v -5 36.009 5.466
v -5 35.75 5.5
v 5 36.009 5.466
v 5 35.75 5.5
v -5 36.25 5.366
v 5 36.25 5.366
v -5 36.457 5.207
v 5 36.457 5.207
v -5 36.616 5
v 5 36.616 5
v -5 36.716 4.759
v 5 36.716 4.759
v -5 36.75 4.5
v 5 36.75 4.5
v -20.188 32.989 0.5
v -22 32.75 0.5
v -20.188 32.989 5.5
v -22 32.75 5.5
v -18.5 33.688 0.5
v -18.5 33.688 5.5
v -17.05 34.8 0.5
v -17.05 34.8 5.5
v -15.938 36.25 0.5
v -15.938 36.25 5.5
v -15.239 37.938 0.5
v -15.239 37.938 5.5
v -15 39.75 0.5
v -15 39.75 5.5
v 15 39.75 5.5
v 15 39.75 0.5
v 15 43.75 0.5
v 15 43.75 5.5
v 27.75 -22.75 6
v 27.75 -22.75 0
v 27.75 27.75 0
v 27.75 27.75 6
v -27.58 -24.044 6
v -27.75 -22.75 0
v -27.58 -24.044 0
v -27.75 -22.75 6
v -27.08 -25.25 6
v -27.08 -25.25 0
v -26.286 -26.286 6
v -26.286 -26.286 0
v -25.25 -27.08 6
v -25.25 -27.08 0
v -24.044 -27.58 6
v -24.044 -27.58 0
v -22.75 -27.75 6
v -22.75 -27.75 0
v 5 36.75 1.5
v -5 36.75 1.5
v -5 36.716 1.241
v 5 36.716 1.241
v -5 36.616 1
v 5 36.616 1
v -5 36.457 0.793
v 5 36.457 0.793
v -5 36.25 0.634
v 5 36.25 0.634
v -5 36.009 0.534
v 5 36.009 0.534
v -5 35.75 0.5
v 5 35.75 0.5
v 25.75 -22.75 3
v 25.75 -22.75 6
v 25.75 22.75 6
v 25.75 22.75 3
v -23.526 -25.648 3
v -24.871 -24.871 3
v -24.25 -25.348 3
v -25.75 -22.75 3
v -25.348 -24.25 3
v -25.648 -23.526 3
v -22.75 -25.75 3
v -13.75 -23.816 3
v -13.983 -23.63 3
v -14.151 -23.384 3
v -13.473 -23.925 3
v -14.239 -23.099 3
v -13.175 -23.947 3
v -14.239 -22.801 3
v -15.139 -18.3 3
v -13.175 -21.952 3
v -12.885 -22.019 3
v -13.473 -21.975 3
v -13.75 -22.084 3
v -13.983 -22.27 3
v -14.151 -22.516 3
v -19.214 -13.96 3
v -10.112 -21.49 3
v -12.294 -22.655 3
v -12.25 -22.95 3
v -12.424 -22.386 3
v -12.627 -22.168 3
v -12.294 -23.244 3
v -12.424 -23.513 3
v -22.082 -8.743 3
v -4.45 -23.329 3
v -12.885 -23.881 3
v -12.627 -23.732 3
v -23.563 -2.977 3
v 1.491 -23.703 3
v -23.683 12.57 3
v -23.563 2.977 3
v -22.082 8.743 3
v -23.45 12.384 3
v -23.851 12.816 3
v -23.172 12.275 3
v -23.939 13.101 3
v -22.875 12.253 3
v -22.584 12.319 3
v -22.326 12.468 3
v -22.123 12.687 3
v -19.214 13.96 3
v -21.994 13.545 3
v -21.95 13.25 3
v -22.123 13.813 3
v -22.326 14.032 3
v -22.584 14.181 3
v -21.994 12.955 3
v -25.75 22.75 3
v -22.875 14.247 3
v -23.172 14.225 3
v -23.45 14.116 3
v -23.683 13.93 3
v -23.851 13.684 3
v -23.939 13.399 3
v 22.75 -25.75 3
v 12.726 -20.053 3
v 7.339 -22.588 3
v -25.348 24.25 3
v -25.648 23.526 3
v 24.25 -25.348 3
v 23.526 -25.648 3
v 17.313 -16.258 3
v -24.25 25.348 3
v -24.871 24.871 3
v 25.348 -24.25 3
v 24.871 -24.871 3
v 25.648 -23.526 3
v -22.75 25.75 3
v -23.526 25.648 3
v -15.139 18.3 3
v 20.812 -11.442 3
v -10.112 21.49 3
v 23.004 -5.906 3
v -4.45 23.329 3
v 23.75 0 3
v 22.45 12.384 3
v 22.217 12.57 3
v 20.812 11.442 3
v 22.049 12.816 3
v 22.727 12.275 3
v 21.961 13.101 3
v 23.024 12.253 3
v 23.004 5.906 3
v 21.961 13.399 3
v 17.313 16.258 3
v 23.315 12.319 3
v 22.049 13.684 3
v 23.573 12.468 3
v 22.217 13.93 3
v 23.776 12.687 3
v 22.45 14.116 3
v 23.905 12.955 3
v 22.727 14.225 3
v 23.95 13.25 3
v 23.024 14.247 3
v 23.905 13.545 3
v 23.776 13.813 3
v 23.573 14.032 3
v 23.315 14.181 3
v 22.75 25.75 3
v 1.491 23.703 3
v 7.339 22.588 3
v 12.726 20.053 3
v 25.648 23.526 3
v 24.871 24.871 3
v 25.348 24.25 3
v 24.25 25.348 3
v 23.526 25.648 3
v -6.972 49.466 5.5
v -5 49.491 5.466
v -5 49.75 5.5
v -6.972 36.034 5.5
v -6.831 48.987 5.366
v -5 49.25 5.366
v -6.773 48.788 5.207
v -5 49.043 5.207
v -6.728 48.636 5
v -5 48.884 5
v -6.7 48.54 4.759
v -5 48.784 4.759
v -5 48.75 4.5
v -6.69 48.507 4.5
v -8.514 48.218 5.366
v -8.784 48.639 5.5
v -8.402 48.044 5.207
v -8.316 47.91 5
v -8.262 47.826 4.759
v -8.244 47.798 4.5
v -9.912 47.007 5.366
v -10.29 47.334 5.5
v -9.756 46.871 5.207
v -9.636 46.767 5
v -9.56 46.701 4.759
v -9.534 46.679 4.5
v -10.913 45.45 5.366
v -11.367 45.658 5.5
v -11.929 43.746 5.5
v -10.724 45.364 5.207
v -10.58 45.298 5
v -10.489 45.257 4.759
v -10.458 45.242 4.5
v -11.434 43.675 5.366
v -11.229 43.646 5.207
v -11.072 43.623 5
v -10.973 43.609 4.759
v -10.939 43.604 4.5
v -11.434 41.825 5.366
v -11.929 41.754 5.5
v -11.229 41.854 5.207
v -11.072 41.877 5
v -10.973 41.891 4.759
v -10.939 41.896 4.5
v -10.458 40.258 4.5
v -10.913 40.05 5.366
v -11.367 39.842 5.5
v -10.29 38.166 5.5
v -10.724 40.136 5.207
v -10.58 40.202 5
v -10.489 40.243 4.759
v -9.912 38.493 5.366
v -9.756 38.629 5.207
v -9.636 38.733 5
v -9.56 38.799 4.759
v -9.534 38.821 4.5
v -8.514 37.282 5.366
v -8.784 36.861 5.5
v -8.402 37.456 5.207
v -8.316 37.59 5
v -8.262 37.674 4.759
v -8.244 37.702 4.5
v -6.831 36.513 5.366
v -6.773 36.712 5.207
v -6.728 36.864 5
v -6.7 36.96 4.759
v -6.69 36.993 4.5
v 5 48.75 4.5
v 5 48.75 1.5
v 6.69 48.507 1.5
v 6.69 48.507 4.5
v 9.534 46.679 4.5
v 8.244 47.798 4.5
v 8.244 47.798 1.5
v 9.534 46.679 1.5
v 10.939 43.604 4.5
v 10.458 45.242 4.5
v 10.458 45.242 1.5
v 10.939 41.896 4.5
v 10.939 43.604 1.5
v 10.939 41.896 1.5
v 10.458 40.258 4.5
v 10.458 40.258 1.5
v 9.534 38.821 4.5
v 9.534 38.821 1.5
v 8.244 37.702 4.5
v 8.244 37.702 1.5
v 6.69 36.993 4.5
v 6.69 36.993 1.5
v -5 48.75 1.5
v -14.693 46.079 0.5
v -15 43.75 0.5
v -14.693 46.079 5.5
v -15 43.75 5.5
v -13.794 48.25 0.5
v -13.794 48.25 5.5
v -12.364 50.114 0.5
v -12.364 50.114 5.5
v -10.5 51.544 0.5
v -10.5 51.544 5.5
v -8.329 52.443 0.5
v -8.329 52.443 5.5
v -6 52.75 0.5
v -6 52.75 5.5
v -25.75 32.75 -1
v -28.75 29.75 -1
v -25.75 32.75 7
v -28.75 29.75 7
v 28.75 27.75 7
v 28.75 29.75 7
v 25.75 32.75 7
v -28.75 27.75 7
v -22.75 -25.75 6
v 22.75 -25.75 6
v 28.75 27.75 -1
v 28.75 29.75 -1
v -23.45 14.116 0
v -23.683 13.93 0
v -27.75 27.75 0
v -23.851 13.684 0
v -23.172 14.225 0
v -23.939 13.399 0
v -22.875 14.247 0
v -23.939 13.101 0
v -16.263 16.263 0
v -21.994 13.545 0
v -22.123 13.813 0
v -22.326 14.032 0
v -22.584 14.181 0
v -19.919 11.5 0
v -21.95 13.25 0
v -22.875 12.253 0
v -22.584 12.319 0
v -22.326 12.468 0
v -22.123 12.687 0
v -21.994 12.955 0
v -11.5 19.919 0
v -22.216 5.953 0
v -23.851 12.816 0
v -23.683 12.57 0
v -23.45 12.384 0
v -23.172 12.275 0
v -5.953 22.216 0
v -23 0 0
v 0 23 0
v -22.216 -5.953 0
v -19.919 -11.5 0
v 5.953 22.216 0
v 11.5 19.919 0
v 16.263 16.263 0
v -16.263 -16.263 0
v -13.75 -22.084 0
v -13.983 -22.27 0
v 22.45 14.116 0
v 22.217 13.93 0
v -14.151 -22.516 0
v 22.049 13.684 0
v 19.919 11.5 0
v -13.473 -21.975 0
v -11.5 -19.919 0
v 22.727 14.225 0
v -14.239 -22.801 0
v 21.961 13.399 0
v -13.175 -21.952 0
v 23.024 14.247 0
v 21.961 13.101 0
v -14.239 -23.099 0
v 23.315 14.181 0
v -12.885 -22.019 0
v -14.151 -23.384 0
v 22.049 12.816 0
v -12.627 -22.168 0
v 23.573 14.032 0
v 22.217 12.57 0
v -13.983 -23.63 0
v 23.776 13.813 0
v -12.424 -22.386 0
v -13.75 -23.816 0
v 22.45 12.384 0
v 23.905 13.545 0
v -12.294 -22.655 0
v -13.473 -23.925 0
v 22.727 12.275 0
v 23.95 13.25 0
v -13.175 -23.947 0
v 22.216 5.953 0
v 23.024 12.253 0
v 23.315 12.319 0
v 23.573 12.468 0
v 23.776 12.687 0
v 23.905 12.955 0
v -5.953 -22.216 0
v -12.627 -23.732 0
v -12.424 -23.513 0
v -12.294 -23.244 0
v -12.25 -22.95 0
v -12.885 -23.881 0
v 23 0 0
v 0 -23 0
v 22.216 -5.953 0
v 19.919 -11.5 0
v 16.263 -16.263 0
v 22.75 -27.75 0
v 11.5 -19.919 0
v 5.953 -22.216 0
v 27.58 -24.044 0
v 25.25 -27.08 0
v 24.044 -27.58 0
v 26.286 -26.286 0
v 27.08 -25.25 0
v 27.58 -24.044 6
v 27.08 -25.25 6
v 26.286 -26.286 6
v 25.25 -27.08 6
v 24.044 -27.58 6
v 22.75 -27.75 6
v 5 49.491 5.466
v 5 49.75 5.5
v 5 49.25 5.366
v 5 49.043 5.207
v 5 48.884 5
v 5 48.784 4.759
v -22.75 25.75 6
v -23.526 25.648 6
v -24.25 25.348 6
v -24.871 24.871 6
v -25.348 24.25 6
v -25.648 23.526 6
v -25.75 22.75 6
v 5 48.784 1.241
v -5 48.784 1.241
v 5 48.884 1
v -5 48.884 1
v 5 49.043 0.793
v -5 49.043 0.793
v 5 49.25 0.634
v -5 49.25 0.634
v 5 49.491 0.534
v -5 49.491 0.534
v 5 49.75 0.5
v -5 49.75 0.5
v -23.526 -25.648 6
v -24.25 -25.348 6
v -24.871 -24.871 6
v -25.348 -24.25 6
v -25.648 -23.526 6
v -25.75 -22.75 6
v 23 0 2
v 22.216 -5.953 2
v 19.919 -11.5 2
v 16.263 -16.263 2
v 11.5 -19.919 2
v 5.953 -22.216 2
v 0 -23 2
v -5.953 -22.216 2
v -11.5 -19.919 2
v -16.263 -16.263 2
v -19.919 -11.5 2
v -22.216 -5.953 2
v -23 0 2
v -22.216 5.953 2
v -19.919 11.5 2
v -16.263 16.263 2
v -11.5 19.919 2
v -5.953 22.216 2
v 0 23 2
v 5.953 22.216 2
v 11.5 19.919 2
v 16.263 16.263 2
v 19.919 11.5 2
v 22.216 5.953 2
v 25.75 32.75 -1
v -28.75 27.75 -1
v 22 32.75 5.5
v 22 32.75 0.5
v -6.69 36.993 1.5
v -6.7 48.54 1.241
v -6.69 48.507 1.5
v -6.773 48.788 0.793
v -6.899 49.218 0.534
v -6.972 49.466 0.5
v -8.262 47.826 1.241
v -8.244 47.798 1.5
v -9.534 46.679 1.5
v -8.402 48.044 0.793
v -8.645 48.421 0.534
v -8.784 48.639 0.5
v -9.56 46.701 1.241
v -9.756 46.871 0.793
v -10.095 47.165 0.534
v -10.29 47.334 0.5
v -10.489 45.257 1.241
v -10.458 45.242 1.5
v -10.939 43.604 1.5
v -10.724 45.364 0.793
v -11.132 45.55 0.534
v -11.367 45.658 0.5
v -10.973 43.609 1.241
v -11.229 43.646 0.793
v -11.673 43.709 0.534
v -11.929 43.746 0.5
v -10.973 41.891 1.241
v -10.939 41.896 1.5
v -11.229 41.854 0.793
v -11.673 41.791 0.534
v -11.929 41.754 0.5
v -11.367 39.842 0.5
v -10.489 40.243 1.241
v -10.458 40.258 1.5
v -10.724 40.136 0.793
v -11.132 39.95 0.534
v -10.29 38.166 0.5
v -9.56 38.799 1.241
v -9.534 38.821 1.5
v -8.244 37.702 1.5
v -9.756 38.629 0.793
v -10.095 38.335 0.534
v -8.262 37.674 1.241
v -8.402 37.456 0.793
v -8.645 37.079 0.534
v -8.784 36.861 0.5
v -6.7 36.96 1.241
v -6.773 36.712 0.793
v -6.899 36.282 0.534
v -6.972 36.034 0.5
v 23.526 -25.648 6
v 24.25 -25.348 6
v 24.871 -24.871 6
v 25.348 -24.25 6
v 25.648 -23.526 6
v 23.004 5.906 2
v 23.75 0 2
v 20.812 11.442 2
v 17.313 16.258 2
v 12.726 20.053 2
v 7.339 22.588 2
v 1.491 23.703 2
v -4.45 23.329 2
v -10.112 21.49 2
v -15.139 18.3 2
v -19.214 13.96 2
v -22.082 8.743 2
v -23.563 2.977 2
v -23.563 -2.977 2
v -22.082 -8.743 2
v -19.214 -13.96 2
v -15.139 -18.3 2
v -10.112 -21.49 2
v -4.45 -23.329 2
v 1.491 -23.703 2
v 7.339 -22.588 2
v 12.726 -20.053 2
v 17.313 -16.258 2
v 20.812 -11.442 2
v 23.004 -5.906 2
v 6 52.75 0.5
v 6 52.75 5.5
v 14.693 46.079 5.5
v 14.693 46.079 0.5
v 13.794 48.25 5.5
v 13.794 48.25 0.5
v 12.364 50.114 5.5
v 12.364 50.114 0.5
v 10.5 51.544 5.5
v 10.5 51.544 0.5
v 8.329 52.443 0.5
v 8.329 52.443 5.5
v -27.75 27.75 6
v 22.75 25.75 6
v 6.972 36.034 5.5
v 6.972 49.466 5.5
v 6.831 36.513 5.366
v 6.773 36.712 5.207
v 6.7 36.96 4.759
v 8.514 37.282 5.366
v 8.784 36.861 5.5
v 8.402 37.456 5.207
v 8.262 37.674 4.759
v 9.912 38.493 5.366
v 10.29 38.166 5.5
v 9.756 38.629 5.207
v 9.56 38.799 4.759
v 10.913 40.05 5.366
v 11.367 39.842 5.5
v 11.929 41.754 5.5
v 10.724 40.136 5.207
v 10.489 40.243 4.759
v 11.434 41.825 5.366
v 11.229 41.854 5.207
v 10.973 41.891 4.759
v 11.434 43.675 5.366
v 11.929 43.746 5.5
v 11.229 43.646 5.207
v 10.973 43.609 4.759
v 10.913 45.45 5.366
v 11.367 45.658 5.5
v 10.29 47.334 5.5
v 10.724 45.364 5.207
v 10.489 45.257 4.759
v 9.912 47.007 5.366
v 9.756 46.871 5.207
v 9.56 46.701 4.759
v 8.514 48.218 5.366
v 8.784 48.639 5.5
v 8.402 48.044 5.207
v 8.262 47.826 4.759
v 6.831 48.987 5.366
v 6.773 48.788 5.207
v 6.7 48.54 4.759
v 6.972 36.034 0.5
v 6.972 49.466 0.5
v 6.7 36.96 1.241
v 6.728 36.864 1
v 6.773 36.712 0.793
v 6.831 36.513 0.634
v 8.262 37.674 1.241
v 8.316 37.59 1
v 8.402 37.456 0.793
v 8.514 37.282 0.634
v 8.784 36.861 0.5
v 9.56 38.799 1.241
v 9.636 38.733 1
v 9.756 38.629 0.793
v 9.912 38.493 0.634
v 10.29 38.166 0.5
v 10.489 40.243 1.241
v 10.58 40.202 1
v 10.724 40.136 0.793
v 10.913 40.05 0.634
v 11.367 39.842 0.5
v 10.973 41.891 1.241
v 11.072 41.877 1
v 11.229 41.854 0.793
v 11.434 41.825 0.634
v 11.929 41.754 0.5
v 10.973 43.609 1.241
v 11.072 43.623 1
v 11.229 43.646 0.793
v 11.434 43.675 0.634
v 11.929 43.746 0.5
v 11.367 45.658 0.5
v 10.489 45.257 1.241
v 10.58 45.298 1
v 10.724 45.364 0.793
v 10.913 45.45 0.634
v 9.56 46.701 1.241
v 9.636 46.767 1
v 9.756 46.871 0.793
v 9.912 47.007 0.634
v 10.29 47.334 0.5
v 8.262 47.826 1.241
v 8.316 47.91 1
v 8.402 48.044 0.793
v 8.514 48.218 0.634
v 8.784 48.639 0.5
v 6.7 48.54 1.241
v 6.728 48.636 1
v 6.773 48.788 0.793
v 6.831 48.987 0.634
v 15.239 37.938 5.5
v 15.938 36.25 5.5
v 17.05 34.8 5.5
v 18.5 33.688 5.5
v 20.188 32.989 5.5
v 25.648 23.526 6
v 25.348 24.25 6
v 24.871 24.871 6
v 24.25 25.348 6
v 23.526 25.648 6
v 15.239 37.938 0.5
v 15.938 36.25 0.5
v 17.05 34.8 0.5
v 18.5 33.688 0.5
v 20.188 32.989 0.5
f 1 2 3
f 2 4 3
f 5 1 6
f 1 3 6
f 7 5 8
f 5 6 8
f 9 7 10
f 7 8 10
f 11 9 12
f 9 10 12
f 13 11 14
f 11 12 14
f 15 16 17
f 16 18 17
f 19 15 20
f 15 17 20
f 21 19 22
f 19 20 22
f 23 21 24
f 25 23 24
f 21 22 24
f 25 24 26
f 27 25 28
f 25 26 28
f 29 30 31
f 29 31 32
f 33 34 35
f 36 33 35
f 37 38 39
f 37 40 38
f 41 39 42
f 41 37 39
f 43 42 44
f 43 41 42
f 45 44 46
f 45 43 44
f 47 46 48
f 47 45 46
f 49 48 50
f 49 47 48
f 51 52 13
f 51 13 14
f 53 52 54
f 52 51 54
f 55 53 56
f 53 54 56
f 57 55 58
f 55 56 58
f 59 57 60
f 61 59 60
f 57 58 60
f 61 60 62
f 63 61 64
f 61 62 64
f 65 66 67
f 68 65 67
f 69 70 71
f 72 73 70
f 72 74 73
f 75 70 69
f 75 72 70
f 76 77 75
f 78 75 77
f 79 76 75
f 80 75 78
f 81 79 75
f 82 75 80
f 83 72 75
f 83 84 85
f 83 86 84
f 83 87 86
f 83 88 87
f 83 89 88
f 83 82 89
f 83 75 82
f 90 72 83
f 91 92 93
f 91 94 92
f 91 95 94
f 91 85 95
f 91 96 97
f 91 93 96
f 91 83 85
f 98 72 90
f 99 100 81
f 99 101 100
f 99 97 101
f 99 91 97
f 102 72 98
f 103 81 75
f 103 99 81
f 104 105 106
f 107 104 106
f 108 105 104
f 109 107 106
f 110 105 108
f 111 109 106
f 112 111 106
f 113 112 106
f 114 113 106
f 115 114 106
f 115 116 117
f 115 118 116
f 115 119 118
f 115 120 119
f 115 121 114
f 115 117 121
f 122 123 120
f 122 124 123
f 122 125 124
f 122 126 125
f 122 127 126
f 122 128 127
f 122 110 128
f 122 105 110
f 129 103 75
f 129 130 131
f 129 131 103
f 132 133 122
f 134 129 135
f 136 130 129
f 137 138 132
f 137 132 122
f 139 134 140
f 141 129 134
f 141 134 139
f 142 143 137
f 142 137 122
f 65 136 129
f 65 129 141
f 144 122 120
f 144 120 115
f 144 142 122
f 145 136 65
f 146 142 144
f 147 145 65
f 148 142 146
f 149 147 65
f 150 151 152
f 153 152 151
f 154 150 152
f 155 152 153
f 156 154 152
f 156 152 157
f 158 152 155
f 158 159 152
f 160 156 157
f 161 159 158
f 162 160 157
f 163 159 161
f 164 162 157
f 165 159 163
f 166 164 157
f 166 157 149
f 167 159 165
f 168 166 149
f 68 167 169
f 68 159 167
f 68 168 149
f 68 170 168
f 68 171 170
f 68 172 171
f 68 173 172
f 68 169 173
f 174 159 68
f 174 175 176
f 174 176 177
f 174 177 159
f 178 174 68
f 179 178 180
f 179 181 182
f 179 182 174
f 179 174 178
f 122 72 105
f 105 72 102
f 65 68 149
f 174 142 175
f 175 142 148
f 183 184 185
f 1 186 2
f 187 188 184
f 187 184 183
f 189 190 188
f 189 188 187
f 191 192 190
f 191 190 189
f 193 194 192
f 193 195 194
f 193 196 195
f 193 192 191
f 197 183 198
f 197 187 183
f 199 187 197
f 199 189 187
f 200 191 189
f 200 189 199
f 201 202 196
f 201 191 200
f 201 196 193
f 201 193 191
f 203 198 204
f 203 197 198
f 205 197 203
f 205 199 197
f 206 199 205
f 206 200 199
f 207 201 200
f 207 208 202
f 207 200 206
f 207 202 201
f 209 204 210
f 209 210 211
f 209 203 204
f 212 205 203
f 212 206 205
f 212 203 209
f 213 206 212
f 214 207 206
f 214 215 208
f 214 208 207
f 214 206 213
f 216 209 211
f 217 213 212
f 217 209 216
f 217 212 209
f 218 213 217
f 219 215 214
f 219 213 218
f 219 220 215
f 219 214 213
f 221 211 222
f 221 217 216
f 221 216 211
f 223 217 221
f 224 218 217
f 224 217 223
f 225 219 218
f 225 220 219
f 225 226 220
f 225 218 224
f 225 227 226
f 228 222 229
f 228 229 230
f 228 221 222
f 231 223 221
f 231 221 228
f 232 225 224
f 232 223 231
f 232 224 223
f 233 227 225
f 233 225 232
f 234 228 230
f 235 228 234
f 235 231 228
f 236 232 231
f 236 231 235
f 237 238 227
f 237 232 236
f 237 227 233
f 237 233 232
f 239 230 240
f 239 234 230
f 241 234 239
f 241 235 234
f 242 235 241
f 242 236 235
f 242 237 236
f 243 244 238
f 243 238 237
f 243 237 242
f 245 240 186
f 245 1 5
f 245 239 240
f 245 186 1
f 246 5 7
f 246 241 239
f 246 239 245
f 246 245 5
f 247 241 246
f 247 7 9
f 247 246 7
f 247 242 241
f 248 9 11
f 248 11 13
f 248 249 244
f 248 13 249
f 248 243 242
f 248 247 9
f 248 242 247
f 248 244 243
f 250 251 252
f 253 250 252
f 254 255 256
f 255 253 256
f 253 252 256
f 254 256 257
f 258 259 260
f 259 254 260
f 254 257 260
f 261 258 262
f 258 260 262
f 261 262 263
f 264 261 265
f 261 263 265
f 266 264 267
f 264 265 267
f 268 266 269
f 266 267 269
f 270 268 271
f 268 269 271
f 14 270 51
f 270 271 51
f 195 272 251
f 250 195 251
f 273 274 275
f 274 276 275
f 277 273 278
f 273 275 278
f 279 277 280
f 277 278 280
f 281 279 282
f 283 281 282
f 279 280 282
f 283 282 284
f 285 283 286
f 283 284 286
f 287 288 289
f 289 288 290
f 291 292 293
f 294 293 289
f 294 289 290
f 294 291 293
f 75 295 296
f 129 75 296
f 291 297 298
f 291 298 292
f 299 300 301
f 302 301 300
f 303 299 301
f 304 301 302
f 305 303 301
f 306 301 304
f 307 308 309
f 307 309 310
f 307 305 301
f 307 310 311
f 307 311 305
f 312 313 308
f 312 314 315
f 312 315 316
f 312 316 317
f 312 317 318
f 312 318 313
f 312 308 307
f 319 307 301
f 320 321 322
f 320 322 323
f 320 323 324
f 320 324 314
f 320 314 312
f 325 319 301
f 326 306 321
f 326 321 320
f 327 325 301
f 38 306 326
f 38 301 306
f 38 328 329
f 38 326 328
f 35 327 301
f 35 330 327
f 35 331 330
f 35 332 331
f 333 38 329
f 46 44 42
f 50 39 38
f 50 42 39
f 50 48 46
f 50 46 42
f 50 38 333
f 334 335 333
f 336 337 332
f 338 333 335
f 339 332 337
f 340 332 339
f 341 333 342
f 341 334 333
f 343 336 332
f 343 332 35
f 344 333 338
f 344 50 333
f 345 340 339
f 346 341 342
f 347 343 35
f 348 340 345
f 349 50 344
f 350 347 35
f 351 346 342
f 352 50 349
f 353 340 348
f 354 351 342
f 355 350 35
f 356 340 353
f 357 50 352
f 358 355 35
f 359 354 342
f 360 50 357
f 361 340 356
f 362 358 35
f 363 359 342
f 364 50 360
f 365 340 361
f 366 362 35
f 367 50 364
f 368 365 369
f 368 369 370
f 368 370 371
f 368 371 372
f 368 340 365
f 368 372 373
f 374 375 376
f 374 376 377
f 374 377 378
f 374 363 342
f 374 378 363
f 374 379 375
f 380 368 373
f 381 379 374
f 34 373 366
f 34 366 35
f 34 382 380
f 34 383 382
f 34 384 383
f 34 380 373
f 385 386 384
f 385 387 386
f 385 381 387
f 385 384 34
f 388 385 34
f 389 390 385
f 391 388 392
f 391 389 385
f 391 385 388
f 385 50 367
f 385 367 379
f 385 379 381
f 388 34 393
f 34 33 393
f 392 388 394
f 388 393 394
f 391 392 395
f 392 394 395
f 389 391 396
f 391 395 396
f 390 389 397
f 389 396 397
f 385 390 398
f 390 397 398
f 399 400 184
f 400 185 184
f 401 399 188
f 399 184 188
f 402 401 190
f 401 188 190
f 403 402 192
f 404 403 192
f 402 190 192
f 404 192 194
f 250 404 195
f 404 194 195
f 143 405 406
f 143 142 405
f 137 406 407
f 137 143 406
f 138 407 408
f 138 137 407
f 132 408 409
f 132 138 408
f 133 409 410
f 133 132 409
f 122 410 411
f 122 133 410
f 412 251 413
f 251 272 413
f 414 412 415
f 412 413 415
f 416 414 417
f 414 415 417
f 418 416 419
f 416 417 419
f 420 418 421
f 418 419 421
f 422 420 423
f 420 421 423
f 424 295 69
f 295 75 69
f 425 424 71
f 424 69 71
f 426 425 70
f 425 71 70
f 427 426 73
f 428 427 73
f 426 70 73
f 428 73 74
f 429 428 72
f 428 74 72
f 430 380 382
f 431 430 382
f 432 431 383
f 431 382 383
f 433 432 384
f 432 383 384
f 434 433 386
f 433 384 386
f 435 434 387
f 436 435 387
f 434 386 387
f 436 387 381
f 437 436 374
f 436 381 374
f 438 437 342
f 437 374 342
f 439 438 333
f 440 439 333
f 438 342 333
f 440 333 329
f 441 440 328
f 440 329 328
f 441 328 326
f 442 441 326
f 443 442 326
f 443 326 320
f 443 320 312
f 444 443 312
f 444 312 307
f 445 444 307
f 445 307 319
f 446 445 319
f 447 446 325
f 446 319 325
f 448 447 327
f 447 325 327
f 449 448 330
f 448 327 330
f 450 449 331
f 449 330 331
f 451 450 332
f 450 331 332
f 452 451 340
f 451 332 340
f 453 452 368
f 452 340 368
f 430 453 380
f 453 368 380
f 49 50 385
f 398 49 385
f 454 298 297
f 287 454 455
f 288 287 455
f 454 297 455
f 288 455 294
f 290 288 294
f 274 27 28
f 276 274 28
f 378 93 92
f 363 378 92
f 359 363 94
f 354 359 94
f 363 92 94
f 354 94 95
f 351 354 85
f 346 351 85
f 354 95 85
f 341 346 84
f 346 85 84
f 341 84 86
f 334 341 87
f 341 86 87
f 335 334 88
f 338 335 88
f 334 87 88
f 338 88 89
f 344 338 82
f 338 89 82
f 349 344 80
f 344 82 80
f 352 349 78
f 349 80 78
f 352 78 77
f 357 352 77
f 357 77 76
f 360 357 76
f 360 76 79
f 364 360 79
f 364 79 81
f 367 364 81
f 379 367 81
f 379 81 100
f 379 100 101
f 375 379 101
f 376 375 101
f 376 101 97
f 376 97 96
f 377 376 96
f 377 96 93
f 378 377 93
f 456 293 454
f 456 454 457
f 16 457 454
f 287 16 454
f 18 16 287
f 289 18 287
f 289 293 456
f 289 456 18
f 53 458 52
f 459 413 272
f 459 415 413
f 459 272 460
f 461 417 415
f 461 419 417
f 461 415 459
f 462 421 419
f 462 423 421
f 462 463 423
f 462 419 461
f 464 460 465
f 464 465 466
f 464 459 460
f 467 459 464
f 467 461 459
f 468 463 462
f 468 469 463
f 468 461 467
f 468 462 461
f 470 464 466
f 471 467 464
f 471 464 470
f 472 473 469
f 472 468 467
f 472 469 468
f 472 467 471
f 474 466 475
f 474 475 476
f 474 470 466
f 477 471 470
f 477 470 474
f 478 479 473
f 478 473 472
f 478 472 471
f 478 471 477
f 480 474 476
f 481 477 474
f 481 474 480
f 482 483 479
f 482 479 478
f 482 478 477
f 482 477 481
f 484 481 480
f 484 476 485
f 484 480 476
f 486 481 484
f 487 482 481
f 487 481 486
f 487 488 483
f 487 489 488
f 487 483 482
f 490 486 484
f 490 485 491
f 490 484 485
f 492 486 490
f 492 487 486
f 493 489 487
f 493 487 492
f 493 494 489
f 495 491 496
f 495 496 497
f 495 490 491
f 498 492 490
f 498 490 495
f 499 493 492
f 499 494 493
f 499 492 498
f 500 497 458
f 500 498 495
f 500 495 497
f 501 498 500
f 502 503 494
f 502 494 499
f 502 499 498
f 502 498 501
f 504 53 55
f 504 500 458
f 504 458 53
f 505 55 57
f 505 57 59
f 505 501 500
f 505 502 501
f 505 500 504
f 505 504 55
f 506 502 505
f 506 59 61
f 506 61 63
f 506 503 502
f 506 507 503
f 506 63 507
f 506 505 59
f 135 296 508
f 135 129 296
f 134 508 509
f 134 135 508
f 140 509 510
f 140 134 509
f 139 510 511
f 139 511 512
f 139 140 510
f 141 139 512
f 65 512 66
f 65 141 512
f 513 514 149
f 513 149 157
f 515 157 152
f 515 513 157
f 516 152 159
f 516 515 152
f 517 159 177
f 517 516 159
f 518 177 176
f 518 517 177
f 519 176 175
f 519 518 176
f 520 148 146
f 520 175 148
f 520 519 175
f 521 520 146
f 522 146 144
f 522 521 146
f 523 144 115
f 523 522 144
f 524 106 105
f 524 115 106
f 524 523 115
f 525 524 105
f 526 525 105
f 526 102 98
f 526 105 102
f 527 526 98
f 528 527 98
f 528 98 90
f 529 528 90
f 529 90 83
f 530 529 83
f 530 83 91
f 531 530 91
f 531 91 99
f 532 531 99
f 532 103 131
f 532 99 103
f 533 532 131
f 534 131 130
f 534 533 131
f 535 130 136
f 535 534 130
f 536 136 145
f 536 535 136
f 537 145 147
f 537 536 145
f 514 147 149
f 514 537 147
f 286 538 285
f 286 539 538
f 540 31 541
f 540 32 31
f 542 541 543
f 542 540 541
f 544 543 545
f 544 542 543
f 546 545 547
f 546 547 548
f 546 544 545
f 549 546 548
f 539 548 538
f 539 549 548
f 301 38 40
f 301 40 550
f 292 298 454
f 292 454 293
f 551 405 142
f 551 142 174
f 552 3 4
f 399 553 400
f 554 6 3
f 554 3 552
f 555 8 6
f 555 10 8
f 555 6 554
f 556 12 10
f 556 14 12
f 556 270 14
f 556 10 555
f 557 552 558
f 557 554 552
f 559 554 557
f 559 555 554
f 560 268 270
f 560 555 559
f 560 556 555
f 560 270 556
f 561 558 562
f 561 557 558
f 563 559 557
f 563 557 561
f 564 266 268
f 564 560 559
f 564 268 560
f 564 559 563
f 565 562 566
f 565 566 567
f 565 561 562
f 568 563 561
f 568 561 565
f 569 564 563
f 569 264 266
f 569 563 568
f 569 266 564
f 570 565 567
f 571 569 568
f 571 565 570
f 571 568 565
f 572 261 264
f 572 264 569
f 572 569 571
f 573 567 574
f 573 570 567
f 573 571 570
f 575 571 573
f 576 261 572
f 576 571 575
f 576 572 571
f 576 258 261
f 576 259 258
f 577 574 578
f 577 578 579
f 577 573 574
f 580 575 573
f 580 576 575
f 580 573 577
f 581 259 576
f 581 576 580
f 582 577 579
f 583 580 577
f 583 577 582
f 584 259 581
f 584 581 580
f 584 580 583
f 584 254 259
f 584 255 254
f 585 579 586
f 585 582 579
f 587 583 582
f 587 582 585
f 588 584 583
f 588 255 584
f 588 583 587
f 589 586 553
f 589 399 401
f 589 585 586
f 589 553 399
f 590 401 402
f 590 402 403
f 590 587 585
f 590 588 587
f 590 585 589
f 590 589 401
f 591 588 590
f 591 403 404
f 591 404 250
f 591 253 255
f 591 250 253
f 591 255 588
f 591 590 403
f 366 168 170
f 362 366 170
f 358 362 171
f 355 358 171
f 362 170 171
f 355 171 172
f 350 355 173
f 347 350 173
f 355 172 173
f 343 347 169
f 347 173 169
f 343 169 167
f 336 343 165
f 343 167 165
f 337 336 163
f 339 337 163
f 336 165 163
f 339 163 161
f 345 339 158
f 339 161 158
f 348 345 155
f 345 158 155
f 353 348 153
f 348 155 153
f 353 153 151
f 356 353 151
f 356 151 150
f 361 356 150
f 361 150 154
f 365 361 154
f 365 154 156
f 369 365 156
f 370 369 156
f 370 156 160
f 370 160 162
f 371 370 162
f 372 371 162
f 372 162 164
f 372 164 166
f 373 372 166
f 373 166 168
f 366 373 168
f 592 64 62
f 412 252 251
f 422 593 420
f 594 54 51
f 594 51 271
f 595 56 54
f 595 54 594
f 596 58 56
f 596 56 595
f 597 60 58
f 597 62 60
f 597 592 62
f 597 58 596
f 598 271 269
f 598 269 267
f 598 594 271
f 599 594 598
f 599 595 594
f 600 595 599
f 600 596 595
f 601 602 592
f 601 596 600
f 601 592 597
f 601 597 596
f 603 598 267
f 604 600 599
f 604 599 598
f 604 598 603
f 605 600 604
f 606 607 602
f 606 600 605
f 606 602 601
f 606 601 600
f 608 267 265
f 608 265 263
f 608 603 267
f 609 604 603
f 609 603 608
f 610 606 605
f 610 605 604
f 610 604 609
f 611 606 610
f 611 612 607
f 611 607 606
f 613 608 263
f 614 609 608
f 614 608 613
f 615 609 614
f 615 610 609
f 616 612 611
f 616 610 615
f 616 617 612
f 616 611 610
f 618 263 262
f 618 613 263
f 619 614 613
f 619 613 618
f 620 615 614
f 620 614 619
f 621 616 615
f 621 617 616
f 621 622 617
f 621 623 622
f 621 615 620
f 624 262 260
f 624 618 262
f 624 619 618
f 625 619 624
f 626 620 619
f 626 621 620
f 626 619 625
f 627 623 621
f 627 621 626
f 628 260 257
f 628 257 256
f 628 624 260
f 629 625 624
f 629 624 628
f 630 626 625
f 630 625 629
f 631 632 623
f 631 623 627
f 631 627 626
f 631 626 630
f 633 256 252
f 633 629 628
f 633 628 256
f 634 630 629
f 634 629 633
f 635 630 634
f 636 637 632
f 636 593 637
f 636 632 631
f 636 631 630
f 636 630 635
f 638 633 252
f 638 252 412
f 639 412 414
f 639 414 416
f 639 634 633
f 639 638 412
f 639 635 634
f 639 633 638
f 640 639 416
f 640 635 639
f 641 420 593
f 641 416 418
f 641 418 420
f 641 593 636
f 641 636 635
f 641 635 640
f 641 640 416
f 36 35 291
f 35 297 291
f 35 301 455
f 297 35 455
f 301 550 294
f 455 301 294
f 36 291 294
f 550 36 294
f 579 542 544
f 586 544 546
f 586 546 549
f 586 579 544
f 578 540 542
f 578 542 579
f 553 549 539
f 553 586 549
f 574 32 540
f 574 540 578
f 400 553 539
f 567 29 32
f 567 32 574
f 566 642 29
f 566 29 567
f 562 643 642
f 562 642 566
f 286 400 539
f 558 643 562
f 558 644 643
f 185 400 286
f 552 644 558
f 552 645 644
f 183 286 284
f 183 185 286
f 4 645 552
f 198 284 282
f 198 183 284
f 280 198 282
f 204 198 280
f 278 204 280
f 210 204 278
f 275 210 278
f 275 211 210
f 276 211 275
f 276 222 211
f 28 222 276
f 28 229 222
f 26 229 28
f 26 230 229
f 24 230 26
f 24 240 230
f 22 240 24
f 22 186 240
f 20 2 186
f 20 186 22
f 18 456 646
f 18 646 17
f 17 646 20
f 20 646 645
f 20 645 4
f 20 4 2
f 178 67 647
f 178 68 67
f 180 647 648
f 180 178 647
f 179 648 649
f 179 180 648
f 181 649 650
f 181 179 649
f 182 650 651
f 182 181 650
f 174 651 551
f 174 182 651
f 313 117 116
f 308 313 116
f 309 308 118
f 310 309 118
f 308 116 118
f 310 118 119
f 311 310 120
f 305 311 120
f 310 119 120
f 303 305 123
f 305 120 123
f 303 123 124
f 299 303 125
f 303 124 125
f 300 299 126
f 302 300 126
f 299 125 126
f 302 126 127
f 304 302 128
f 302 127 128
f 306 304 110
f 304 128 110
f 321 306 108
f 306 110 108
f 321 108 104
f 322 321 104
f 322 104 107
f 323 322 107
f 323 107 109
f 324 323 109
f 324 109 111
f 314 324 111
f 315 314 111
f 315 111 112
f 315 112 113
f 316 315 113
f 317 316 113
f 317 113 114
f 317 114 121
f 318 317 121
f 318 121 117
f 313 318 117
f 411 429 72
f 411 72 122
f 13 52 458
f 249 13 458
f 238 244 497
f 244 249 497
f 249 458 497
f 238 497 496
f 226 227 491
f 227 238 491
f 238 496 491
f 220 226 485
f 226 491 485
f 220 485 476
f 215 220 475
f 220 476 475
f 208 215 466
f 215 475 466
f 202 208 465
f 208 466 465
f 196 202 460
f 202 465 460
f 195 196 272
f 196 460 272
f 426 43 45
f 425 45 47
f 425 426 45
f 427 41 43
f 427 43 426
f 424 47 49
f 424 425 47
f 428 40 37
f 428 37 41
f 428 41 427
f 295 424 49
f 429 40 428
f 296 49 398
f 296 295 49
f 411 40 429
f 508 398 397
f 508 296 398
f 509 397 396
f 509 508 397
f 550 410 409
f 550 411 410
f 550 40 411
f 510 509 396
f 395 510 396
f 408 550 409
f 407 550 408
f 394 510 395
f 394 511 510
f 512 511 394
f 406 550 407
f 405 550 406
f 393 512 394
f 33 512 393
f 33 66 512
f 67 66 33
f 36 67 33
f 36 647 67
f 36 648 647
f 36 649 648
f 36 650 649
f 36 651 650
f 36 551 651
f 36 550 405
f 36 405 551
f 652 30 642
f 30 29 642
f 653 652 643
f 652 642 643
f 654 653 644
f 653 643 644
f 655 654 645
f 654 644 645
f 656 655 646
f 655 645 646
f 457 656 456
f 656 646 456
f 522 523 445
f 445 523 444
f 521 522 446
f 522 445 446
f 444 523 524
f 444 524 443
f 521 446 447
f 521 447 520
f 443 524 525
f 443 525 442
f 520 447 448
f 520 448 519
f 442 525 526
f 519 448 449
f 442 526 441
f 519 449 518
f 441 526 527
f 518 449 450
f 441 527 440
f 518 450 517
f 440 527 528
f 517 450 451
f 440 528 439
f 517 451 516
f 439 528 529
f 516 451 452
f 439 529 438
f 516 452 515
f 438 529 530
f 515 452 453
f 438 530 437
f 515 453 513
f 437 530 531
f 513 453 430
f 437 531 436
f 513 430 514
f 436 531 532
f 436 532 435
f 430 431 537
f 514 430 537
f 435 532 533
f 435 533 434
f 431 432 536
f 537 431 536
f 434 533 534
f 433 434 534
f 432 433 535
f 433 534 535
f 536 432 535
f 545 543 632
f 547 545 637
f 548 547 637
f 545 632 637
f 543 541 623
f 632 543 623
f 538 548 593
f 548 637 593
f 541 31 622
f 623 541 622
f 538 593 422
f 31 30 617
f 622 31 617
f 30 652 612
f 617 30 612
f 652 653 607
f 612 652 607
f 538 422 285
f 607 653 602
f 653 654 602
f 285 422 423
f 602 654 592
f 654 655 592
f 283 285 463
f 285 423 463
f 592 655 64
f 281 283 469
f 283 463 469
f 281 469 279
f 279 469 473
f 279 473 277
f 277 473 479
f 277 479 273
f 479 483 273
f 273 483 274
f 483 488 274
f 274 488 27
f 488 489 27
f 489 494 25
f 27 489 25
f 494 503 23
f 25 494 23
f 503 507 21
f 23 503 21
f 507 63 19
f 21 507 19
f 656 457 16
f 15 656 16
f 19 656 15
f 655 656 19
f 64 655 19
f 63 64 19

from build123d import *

# Parameters (mm, degrees)
SKETCH_W        = 55.5
SKETCH_H        = 55.5
SKETCH_R        = 23.75
PAD_DEPTH       = 6
SKETCH001_W     = 57.5
SKETCH001_H     = 8
PAD001_DEPTH    = 5
SKETCH002_W     = 30
SKETCH002_H     = 5
PAD002_DEPTH    = 20
FILLET_R        = 5
POCKET_DEPTH    = 6
FILLET001_R     = 9
FILLET002_R     = 7
CHAMFER_SIZE    = 3
SKETCH004_R     = 23.75
SKETCH004_R_2   = 23
PAD003_DEPTH    = 2
SKETCH005_W     = 51.5
SKETCH005_H     = 51.5
POCKET001_DEPTH = 3
SKETCH006_R     = 1
POCKET002_DEPTH = 6
FILLET003_R     = 1
FILLET004_R     = 1
FILLET005_R     = 3


with BuildPart() as part:
    # Sketch → Pad (new body)
    with BuildSketch(Plane.XY):
        Rectangle(SKETCH_W, SKETCH_H)
        Circle(SKETCH_R, mode=Mode.SUBTRACT)
    extrude(amount=PAD_DEPTH)

    # Sketch001 → Pad001 (new body)
    with BuildSketch(Plane(origin=(0, 27.75, 0), x_dir=(-1, 0, 0), z_dir=(0, 1, 0))):
        with Locations((0, 3)):
            Rectangle(SKETCH001_W, SKETCH001_H)
    extrude(amount=PAD001_DEPTH)

    # Sketch002 → Pad002 (new body)
    with BuildSketch(Plane(origin=(0, 32.75, 0), x_dir=(-1, 0, 0), z_dir=(0, 1, 0))):
        with Locations((0, 3)):
            Rectangle(SKETCH002_W, SKETCH002_H)
    extrude(amount=PAD002_DEPTH)

    # Fillet
    fillet_edges = [part.edges().sort_by_distance(p)[0] for p in [
        (-27.75, -27.75, 3),
        (27.75, -27.75, 3),
    ]]
    fillet(fillet_edges, radius=FILLET_R)

    # Sketch003 → Pocket (cut)
    with BuildSketch(Plane(origin=(0, 0, 0.5), x_dir=(1, 0, 0), z_dir=(0, 0, -1))):
        with BuildLine():
            ThreePointArc((-5, -36.75), (-11, -42.75), (-5, -48.75))
            Line((-5, -48.75), (5, -48.75))
            ThreePointArc((5, -48.75), (11, -42.75), (5, -36.75))
            Line((-5, -36.75), (5, -36.75))
        make_face()
    extrude(amount=-POCKET_DEPTH, mode=Mode.SUBTRACT)

    # Fillet001
    fillet001_edges = [part.edges().sort_by_distance(p)[0] for p in [
        (15, 52.75, 3),
        (-15, 52.75, 3),
    ]]
    fillet(fillet001_edges, radius=FILLET001_R)

    # Fillet002
    fillet002_edges = [part.edges().sort_by_distance(p)[0] for p in [
        (15, 32.75, 3),
        (-15, 32.75, 3),
    ]]
    fillet(fillet002_edges, radius=FILLET002_R)

    # Chamfer
    chamfer_edges = [part.edges().sort_by_distance(p)[0] for p in [
        (-28.75, 32.75, 3),
        (28.75, 32.75, 3),
    ]]
    chamfer(chamfer_edges, length=CHAMFER_SIZE)

    # Sketch004 → Pad003 (new body)
    with BuildSketch(Plane(origin=(0, 0, 0), x_dir=(1, 0, 0), z_dir=(0, 0, -1))):
        Circle(SKETCH004_R)
        Circle(SKETCH004_R_2, mode=Mode.SUBTRACT)
    extrude(amount=-PAD003_DEPTH)

    # Sketch005 → Pocket001 (cut)
    with BuildSketch(Plane.XY.offset(6)):
        Rectangle(SKETCH005_W, SKETCH005_H)
    extrude(amount=-POCKET001_DEPTH, mode=Mode.SUBTRACT)

    # Sketch006 → Pocket002 (cut)
    with BuildSketch(Plane.XY.offset(3)):
        with Locations((-22.949673, 13.25)):
            Circle(SKETCH006_R)
        with Locations((22.949673, 13.25)):
            Circle(SKETCH006_R)
        with Locations((-13.25, -22.949673)):
            Circle(SKETCH006_R)
    extrude(amount=-POCKET002_DEPTH, mode=Mode.SUBTRACT)

    # Fillet003
    fillet003_edges = [part.edges().sort_by_distance(p)[0] for p in [
        (0, 48.75, 5.5),
    ]]
    fillet(fillet003_edges, radius=FILLET003_R)

    # Fillet004
    fillet004_edges = [part.edges().sort_by_distance(p)[0] for p in [
        (0, 36.75, 0.5),
    ]]
    fillet(fillet004_edges, radius=FILLET004_R)

    # Fillet005
    fillet005_edges = [part.edges().sort_by_distance(p)[0] for p in [
        (-25.75, -25.75, 4.5),
        (25.75, -25.75, 4.5),
        (25.75, 25.75, 4.5),
        (-25.75, 25.75, 4.5),
    ]]
    fillet(fillet005_edges, radius=FILLET005_R)


solid = part.part
